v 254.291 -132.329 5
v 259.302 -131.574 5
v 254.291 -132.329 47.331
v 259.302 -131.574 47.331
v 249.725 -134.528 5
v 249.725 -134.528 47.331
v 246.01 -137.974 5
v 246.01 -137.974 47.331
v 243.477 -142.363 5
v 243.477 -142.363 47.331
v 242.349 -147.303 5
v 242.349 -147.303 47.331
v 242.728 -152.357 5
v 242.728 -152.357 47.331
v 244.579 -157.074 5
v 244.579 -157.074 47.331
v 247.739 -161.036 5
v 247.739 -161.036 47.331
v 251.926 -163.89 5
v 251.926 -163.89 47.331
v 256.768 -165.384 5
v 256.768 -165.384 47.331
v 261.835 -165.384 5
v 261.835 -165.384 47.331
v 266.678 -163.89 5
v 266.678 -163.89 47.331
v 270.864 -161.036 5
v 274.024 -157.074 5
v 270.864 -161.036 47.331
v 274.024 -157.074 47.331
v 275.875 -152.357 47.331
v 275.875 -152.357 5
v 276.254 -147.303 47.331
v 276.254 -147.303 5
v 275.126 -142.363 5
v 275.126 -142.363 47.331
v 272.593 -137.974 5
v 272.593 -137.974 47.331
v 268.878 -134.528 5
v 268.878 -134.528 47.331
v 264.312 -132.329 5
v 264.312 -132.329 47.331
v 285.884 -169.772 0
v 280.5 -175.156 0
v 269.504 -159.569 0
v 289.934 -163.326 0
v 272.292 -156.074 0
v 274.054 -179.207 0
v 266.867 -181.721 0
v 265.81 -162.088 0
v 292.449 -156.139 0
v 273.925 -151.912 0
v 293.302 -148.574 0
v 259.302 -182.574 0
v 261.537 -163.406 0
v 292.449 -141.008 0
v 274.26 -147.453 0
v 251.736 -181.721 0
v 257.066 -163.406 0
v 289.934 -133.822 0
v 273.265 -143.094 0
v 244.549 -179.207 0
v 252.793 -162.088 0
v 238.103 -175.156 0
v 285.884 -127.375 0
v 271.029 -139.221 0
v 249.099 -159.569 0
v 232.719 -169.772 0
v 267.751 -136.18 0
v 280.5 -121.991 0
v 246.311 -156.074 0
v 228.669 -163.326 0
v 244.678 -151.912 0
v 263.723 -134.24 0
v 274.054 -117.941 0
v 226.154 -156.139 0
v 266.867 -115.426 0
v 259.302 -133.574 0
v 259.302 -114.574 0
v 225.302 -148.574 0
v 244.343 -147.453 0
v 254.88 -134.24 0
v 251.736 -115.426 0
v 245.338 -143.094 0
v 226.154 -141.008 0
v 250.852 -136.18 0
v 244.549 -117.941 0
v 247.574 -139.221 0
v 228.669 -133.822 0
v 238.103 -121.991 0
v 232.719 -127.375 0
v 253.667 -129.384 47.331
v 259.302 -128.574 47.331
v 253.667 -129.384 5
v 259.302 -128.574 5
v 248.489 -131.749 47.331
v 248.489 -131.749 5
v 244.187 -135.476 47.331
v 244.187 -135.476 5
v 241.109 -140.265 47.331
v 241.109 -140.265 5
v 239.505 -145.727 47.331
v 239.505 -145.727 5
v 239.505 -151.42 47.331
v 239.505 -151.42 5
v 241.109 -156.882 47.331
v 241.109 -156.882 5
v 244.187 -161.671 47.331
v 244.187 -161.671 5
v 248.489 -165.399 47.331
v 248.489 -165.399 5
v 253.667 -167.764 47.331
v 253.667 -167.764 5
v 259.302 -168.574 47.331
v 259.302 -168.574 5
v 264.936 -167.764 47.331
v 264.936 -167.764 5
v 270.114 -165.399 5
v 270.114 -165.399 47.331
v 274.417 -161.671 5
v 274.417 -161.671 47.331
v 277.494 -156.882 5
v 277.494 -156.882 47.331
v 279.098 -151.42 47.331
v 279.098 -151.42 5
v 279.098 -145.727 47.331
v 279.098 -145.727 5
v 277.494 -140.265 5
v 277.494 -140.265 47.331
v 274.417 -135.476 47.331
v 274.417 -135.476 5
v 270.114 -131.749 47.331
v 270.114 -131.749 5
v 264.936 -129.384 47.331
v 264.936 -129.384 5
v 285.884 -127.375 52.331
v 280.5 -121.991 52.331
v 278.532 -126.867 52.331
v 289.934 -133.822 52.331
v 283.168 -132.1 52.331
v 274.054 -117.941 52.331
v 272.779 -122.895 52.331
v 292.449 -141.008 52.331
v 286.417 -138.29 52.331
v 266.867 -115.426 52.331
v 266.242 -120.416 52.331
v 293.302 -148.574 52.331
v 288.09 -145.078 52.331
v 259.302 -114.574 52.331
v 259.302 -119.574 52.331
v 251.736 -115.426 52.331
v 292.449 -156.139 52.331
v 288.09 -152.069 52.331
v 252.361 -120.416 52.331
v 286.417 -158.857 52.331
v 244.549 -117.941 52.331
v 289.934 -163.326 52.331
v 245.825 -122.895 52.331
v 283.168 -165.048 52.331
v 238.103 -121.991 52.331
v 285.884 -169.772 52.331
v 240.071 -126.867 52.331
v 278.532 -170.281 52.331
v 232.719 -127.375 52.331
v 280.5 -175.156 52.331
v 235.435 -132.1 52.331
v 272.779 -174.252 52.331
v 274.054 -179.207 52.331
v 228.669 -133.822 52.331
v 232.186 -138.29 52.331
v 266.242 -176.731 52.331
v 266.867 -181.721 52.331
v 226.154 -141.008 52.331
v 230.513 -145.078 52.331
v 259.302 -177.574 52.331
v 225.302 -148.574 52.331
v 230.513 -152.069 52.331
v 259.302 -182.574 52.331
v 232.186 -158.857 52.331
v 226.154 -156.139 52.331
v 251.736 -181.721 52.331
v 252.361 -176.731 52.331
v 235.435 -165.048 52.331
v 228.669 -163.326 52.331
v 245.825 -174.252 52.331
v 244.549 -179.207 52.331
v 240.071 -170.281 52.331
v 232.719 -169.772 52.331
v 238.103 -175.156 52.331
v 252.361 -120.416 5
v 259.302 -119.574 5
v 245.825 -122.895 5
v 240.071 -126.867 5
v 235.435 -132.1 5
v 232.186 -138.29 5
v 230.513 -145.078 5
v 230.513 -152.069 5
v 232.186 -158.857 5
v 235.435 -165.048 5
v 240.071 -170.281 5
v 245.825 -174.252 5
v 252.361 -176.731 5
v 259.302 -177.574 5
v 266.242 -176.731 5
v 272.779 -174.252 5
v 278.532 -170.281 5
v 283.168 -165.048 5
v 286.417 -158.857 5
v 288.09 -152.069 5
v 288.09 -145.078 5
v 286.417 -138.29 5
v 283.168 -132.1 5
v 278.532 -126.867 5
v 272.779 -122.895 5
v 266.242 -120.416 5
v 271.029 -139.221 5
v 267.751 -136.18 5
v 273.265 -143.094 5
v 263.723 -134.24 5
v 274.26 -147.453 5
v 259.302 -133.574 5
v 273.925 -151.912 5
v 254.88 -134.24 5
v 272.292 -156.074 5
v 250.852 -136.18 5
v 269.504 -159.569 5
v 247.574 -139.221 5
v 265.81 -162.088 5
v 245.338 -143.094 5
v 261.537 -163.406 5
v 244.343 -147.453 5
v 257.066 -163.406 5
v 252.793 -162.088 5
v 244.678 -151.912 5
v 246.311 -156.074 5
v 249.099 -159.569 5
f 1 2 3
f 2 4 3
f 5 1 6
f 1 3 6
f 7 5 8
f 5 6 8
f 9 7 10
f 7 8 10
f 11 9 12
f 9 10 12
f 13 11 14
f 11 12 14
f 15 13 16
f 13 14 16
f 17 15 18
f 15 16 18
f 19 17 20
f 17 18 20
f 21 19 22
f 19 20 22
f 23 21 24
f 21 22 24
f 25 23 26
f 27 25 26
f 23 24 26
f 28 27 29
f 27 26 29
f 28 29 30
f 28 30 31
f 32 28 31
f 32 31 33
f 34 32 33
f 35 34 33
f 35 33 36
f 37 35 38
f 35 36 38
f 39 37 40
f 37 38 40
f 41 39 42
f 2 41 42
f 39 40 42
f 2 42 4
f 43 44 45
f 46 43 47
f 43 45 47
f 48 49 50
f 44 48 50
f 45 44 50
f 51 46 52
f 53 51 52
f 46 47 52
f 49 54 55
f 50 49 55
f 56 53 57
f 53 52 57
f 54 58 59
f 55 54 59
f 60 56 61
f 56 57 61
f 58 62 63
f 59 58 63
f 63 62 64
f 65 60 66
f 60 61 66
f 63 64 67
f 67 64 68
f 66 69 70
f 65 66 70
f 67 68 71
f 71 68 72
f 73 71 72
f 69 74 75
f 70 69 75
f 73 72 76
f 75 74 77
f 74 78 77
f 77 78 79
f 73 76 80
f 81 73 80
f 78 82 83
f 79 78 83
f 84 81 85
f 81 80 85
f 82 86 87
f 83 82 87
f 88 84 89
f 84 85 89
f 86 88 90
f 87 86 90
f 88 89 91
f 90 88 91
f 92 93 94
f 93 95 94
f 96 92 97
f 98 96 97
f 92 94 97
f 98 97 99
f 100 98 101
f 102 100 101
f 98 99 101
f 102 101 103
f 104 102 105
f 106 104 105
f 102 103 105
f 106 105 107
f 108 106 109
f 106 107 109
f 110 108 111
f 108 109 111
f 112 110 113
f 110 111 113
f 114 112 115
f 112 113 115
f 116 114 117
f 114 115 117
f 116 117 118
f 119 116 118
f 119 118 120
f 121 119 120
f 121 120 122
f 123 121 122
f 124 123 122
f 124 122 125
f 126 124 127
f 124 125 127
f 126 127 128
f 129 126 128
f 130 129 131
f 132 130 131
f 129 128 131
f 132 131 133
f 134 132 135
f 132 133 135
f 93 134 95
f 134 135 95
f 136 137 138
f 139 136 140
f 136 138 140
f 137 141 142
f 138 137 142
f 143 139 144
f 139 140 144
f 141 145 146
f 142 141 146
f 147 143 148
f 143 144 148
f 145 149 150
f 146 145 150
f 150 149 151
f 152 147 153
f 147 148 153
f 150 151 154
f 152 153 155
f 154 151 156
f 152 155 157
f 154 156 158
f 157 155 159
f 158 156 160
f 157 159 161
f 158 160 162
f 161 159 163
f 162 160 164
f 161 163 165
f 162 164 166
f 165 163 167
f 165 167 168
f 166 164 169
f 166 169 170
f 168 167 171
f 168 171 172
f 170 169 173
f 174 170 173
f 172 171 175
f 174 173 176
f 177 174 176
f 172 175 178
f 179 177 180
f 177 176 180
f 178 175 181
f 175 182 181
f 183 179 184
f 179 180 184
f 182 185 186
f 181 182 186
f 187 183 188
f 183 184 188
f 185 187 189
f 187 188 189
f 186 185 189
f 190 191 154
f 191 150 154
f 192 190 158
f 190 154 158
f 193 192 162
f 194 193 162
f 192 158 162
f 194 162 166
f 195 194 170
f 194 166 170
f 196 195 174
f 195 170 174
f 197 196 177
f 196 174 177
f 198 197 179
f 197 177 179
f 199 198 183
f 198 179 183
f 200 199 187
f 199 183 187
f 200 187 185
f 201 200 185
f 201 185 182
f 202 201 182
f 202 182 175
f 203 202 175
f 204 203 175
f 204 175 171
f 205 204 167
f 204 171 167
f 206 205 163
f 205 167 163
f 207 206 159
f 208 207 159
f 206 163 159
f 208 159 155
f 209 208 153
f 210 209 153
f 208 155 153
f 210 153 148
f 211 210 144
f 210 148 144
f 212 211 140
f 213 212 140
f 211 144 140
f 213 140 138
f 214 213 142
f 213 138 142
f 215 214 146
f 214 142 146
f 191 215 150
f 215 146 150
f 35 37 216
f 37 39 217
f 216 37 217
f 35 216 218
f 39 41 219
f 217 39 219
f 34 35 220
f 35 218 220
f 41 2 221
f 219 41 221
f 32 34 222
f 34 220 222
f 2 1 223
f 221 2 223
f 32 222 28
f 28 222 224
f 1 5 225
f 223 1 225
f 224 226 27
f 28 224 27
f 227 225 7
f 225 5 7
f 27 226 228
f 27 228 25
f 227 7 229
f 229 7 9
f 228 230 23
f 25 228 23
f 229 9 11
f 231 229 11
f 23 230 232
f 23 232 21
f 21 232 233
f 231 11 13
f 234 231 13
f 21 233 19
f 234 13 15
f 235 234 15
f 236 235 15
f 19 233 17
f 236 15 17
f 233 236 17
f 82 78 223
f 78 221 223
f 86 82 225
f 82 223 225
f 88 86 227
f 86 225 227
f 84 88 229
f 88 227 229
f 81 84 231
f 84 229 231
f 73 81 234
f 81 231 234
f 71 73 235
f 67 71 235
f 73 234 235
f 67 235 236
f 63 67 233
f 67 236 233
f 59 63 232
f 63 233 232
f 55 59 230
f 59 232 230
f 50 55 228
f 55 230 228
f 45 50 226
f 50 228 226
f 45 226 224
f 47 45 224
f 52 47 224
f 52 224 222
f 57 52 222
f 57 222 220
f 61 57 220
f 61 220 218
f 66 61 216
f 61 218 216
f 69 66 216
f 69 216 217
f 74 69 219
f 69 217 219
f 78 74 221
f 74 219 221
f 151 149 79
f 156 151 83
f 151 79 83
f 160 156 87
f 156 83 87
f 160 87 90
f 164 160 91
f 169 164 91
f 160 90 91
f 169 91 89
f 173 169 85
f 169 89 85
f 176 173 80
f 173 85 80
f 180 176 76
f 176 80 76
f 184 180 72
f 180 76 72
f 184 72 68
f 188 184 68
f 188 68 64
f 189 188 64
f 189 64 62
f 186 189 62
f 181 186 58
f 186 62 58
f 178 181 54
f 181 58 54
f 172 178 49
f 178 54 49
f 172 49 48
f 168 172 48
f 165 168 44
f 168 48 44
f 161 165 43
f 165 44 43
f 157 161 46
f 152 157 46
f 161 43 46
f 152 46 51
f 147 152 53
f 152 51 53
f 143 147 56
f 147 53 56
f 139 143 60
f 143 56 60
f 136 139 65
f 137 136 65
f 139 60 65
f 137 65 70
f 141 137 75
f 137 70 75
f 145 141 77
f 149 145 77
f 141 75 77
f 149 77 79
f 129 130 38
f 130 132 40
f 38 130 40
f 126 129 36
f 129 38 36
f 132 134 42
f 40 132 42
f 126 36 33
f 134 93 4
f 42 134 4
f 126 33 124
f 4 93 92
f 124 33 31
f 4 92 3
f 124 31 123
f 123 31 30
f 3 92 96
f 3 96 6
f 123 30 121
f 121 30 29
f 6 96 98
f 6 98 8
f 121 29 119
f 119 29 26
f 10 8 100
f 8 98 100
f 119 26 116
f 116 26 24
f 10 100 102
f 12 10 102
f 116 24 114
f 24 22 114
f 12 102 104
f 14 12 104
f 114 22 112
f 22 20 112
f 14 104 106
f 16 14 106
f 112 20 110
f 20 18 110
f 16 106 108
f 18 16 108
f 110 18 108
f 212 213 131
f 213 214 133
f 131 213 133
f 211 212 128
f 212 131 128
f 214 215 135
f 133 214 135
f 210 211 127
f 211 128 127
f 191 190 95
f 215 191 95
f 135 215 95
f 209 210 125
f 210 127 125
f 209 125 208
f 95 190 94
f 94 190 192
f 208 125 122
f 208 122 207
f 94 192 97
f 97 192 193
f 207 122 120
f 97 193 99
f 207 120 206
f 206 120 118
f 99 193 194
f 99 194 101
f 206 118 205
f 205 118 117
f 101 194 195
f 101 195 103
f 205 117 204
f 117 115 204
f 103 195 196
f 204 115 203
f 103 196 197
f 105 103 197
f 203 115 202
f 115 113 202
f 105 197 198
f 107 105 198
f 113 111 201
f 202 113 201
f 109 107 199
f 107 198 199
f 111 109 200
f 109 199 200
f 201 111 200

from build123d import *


with BuildPart() as part:
    # Sketch2 → Revolve1 (revolve)
    with BuildSketch(Plane.ZY.offset(-259.301545348)):
        Polygon((0, -133.573704322), (5, -133.573704322), (5, -131.573704322), (47.330517131, -131.573704322), (47.330517131, -128.573704322), (5, -128.573704322), (5, -119.573704322), (52.330517131, -119.573704322), (52.330517131, -114.573704322), (0, -114.573704322), align=None)
    revolve(axis=Axis((259.301545348, -148.573704322, -1.12), (0, 0, 1)))


solid = part.part
